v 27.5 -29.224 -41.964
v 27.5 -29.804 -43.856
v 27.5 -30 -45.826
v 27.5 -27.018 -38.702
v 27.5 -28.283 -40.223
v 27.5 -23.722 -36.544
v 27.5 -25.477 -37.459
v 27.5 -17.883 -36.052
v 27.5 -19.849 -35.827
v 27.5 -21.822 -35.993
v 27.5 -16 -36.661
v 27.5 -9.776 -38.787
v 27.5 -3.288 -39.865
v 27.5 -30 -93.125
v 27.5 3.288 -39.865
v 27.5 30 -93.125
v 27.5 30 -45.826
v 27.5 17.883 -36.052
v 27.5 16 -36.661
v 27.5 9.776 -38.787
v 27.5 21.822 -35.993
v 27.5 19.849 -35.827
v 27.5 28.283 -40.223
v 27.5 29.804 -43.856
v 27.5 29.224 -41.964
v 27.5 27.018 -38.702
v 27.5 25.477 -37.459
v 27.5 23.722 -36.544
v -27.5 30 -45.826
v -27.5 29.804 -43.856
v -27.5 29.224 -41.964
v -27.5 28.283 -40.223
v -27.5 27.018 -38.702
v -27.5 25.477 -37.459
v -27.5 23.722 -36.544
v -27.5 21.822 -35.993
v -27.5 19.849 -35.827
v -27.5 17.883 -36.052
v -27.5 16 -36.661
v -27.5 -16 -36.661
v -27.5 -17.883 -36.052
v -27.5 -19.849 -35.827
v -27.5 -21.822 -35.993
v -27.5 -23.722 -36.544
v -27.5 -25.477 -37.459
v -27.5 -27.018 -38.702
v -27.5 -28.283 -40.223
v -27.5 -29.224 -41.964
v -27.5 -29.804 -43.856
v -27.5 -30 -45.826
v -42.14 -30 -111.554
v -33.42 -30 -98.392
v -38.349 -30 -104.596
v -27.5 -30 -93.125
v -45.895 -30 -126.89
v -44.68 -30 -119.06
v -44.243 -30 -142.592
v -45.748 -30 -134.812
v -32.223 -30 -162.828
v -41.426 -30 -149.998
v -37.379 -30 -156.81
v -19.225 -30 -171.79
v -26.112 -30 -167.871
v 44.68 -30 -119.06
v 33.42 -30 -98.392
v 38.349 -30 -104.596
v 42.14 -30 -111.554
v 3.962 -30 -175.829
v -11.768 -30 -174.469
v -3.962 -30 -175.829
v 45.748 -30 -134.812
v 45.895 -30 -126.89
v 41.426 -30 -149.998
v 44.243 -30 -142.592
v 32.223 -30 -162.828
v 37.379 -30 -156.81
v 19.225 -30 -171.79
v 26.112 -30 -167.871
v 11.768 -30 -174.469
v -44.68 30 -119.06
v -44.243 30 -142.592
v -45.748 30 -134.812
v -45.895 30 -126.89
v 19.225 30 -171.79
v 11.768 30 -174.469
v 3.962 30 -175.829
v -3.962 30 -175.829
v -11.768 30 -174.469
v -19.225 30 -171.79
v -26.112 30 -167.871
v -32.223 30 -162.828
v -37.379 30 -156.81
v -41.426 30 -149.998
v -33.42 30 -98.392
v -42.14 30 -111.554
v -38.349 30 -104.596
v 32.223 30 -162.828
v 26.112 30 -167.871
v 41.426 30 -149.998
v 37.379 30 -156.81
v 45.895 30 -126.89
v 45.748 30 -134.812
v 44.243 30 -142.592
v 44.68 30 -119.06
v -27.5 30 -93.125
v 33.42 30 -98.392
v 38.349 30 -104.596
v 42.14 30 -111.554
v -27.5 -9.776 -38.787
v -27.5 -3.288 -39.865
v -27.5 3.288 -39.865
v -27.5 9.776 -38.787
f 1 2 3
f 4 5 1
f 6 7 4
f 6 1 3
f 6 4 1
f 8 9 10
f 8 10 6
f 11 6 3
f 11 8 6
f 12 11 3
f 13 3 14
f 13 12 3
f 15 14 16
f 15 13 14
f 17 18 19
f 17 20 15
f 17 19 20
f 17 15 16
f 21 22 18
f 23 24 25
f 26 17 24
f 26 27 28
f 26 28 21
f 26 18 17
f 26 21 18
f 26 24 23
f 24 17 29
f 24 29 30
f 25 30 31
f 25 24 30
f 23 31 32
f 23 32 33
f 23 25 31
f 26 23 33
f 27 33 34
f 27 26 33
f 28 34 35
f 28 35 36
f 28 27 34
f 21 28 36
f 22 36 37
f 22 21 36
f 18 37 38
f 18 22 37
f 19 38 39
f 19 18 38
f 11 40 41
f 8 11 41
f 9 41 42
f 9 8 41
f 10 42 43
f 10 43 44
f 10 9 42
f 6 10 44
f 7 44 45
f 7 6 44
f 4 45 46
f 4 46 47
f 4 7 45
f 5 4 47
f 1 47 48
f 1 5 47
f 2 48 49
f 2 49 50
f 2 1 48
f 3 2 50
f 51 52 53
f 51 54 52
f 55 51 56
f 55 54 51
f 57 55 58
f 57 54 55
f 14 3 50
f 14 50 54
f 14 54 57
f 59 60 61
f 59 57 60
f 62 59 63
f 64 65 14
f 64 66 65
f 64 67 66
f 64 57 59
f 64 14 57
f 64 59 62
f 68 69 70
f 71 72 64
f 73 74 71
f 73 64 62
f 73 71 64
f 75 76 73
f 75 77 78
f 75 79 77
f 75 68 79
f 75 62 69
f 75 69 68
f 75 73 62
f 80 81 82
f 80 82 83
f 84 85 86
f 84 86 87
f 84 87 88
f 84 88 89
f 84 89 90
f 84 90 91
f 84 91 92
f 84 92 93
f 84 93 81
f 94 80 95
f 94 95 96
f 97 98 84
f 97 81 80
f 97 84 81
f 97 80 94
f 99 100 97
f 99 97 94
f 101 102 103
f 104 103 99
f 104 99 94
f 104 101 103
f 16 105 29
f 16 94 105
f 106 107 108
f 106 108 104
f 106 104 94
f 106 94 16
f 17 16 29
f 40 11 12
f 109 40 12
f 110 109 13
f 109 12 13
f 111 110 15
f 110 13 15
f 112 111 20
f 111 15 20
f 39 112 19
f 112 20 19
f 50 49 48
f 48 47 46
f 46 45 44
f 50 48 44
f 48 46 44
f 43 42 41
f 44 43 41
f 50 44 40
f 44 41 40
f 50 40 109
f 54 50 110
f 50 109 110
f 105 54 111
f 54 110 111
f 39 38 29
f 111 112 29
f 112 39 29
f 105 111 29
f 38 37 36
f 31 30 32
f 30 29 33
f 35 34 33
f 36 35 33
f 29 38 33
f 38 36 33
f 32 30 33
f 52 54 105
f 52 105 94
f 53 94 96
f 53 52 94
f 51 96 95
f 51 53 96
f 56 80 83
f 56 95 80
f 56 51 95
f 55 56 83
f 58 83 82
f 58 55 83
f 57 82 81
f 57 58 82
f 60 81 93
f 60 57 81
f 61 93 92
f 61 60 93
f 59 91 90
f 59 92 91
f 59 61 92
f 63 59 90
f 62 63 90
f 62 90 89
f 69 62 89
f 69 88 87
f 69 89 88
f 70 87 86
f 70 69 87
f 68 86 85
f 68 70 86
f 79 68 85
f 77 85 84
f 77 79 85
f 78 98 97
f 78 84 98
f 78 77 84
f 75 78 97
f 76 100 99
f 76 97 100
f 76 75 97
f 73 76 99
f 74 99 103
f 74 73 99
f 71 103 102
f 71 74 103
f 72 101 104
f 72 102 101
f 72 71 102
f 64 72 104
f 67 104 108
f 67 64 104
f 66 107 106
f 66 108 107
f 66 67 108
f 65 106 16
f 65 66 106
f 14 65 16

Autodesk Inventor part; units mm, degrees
ref_plane "YZ Plane" through (0, 0, 0) normal (1, 0, 0) x (0, 1, 0)
ref_plane "XZ Plane" through (0, 0, 0) normal (0, 1, 0) x (-1, 0, 0)
sketch "Sketch1" plane through (0, 0, 0) normal (1, 0, 0) x (0, 1, 0)
  circle A0 centre (0, 0) radius 30
  line L0 (-30, 0) -> (-30, -130)
  line L1 (-30, -130) -> (30, -130)
  line L2 (30, -130) -> (30, 0)
  circle A1 centre (0, 0) radius 40
  line L3 (0, -50) -> (15, -50)
  line L4 (15, -50) -> (15, -85)
  line L5 (15, -85) -> (0, -85)
  line L6 (0, -85) -> (0, -50)
  point P0 (30, -26.4575)
  point P1 (-30, -26.4575)
  point P2 (0, -40)
  dimension "d16" = 80
  dimension "d0" = 60
  dimension "d1" = 130
  dimension "d18" = 30
  dimension "d19" = 45
  dimension "d20" = 10
  dimension "d21" = 35
extrude "Extrusion1" add sketch "Sketch1" along normal mid plane 55 contours L2 L1 L0 A1 | L3 L4 L5 L6
sketch "Sketch2" plane through (0, 0, 0) normal (0, 1, 0) x (-1, 0, 0)
  line L0 (27.5, -130) -> (-27.5, -130) projected
  circle A0 centre (0, -130) radius 46
  point P0 (0, 0)
  dimension "d4" = 92
extrude "Extrusion2" add sketch "Sketch2" along normal mid plane 60
ref_plane "Work Plane1" through (0, 0, -84) normal (0, 0, 1) x (1, 0, 0)
fillet "Fillet1" radius 10 2 edges at (0, 30, -26.4575) (0, -30, -26.4575)
sketch "Sketch3" plane through (0, 0, -84) normal (0, 0, 1) x (1, 0, 0)
  circle A0 centre (0, 0) radius 10
  dimension "d13" = 20
properties part number "thigh"
